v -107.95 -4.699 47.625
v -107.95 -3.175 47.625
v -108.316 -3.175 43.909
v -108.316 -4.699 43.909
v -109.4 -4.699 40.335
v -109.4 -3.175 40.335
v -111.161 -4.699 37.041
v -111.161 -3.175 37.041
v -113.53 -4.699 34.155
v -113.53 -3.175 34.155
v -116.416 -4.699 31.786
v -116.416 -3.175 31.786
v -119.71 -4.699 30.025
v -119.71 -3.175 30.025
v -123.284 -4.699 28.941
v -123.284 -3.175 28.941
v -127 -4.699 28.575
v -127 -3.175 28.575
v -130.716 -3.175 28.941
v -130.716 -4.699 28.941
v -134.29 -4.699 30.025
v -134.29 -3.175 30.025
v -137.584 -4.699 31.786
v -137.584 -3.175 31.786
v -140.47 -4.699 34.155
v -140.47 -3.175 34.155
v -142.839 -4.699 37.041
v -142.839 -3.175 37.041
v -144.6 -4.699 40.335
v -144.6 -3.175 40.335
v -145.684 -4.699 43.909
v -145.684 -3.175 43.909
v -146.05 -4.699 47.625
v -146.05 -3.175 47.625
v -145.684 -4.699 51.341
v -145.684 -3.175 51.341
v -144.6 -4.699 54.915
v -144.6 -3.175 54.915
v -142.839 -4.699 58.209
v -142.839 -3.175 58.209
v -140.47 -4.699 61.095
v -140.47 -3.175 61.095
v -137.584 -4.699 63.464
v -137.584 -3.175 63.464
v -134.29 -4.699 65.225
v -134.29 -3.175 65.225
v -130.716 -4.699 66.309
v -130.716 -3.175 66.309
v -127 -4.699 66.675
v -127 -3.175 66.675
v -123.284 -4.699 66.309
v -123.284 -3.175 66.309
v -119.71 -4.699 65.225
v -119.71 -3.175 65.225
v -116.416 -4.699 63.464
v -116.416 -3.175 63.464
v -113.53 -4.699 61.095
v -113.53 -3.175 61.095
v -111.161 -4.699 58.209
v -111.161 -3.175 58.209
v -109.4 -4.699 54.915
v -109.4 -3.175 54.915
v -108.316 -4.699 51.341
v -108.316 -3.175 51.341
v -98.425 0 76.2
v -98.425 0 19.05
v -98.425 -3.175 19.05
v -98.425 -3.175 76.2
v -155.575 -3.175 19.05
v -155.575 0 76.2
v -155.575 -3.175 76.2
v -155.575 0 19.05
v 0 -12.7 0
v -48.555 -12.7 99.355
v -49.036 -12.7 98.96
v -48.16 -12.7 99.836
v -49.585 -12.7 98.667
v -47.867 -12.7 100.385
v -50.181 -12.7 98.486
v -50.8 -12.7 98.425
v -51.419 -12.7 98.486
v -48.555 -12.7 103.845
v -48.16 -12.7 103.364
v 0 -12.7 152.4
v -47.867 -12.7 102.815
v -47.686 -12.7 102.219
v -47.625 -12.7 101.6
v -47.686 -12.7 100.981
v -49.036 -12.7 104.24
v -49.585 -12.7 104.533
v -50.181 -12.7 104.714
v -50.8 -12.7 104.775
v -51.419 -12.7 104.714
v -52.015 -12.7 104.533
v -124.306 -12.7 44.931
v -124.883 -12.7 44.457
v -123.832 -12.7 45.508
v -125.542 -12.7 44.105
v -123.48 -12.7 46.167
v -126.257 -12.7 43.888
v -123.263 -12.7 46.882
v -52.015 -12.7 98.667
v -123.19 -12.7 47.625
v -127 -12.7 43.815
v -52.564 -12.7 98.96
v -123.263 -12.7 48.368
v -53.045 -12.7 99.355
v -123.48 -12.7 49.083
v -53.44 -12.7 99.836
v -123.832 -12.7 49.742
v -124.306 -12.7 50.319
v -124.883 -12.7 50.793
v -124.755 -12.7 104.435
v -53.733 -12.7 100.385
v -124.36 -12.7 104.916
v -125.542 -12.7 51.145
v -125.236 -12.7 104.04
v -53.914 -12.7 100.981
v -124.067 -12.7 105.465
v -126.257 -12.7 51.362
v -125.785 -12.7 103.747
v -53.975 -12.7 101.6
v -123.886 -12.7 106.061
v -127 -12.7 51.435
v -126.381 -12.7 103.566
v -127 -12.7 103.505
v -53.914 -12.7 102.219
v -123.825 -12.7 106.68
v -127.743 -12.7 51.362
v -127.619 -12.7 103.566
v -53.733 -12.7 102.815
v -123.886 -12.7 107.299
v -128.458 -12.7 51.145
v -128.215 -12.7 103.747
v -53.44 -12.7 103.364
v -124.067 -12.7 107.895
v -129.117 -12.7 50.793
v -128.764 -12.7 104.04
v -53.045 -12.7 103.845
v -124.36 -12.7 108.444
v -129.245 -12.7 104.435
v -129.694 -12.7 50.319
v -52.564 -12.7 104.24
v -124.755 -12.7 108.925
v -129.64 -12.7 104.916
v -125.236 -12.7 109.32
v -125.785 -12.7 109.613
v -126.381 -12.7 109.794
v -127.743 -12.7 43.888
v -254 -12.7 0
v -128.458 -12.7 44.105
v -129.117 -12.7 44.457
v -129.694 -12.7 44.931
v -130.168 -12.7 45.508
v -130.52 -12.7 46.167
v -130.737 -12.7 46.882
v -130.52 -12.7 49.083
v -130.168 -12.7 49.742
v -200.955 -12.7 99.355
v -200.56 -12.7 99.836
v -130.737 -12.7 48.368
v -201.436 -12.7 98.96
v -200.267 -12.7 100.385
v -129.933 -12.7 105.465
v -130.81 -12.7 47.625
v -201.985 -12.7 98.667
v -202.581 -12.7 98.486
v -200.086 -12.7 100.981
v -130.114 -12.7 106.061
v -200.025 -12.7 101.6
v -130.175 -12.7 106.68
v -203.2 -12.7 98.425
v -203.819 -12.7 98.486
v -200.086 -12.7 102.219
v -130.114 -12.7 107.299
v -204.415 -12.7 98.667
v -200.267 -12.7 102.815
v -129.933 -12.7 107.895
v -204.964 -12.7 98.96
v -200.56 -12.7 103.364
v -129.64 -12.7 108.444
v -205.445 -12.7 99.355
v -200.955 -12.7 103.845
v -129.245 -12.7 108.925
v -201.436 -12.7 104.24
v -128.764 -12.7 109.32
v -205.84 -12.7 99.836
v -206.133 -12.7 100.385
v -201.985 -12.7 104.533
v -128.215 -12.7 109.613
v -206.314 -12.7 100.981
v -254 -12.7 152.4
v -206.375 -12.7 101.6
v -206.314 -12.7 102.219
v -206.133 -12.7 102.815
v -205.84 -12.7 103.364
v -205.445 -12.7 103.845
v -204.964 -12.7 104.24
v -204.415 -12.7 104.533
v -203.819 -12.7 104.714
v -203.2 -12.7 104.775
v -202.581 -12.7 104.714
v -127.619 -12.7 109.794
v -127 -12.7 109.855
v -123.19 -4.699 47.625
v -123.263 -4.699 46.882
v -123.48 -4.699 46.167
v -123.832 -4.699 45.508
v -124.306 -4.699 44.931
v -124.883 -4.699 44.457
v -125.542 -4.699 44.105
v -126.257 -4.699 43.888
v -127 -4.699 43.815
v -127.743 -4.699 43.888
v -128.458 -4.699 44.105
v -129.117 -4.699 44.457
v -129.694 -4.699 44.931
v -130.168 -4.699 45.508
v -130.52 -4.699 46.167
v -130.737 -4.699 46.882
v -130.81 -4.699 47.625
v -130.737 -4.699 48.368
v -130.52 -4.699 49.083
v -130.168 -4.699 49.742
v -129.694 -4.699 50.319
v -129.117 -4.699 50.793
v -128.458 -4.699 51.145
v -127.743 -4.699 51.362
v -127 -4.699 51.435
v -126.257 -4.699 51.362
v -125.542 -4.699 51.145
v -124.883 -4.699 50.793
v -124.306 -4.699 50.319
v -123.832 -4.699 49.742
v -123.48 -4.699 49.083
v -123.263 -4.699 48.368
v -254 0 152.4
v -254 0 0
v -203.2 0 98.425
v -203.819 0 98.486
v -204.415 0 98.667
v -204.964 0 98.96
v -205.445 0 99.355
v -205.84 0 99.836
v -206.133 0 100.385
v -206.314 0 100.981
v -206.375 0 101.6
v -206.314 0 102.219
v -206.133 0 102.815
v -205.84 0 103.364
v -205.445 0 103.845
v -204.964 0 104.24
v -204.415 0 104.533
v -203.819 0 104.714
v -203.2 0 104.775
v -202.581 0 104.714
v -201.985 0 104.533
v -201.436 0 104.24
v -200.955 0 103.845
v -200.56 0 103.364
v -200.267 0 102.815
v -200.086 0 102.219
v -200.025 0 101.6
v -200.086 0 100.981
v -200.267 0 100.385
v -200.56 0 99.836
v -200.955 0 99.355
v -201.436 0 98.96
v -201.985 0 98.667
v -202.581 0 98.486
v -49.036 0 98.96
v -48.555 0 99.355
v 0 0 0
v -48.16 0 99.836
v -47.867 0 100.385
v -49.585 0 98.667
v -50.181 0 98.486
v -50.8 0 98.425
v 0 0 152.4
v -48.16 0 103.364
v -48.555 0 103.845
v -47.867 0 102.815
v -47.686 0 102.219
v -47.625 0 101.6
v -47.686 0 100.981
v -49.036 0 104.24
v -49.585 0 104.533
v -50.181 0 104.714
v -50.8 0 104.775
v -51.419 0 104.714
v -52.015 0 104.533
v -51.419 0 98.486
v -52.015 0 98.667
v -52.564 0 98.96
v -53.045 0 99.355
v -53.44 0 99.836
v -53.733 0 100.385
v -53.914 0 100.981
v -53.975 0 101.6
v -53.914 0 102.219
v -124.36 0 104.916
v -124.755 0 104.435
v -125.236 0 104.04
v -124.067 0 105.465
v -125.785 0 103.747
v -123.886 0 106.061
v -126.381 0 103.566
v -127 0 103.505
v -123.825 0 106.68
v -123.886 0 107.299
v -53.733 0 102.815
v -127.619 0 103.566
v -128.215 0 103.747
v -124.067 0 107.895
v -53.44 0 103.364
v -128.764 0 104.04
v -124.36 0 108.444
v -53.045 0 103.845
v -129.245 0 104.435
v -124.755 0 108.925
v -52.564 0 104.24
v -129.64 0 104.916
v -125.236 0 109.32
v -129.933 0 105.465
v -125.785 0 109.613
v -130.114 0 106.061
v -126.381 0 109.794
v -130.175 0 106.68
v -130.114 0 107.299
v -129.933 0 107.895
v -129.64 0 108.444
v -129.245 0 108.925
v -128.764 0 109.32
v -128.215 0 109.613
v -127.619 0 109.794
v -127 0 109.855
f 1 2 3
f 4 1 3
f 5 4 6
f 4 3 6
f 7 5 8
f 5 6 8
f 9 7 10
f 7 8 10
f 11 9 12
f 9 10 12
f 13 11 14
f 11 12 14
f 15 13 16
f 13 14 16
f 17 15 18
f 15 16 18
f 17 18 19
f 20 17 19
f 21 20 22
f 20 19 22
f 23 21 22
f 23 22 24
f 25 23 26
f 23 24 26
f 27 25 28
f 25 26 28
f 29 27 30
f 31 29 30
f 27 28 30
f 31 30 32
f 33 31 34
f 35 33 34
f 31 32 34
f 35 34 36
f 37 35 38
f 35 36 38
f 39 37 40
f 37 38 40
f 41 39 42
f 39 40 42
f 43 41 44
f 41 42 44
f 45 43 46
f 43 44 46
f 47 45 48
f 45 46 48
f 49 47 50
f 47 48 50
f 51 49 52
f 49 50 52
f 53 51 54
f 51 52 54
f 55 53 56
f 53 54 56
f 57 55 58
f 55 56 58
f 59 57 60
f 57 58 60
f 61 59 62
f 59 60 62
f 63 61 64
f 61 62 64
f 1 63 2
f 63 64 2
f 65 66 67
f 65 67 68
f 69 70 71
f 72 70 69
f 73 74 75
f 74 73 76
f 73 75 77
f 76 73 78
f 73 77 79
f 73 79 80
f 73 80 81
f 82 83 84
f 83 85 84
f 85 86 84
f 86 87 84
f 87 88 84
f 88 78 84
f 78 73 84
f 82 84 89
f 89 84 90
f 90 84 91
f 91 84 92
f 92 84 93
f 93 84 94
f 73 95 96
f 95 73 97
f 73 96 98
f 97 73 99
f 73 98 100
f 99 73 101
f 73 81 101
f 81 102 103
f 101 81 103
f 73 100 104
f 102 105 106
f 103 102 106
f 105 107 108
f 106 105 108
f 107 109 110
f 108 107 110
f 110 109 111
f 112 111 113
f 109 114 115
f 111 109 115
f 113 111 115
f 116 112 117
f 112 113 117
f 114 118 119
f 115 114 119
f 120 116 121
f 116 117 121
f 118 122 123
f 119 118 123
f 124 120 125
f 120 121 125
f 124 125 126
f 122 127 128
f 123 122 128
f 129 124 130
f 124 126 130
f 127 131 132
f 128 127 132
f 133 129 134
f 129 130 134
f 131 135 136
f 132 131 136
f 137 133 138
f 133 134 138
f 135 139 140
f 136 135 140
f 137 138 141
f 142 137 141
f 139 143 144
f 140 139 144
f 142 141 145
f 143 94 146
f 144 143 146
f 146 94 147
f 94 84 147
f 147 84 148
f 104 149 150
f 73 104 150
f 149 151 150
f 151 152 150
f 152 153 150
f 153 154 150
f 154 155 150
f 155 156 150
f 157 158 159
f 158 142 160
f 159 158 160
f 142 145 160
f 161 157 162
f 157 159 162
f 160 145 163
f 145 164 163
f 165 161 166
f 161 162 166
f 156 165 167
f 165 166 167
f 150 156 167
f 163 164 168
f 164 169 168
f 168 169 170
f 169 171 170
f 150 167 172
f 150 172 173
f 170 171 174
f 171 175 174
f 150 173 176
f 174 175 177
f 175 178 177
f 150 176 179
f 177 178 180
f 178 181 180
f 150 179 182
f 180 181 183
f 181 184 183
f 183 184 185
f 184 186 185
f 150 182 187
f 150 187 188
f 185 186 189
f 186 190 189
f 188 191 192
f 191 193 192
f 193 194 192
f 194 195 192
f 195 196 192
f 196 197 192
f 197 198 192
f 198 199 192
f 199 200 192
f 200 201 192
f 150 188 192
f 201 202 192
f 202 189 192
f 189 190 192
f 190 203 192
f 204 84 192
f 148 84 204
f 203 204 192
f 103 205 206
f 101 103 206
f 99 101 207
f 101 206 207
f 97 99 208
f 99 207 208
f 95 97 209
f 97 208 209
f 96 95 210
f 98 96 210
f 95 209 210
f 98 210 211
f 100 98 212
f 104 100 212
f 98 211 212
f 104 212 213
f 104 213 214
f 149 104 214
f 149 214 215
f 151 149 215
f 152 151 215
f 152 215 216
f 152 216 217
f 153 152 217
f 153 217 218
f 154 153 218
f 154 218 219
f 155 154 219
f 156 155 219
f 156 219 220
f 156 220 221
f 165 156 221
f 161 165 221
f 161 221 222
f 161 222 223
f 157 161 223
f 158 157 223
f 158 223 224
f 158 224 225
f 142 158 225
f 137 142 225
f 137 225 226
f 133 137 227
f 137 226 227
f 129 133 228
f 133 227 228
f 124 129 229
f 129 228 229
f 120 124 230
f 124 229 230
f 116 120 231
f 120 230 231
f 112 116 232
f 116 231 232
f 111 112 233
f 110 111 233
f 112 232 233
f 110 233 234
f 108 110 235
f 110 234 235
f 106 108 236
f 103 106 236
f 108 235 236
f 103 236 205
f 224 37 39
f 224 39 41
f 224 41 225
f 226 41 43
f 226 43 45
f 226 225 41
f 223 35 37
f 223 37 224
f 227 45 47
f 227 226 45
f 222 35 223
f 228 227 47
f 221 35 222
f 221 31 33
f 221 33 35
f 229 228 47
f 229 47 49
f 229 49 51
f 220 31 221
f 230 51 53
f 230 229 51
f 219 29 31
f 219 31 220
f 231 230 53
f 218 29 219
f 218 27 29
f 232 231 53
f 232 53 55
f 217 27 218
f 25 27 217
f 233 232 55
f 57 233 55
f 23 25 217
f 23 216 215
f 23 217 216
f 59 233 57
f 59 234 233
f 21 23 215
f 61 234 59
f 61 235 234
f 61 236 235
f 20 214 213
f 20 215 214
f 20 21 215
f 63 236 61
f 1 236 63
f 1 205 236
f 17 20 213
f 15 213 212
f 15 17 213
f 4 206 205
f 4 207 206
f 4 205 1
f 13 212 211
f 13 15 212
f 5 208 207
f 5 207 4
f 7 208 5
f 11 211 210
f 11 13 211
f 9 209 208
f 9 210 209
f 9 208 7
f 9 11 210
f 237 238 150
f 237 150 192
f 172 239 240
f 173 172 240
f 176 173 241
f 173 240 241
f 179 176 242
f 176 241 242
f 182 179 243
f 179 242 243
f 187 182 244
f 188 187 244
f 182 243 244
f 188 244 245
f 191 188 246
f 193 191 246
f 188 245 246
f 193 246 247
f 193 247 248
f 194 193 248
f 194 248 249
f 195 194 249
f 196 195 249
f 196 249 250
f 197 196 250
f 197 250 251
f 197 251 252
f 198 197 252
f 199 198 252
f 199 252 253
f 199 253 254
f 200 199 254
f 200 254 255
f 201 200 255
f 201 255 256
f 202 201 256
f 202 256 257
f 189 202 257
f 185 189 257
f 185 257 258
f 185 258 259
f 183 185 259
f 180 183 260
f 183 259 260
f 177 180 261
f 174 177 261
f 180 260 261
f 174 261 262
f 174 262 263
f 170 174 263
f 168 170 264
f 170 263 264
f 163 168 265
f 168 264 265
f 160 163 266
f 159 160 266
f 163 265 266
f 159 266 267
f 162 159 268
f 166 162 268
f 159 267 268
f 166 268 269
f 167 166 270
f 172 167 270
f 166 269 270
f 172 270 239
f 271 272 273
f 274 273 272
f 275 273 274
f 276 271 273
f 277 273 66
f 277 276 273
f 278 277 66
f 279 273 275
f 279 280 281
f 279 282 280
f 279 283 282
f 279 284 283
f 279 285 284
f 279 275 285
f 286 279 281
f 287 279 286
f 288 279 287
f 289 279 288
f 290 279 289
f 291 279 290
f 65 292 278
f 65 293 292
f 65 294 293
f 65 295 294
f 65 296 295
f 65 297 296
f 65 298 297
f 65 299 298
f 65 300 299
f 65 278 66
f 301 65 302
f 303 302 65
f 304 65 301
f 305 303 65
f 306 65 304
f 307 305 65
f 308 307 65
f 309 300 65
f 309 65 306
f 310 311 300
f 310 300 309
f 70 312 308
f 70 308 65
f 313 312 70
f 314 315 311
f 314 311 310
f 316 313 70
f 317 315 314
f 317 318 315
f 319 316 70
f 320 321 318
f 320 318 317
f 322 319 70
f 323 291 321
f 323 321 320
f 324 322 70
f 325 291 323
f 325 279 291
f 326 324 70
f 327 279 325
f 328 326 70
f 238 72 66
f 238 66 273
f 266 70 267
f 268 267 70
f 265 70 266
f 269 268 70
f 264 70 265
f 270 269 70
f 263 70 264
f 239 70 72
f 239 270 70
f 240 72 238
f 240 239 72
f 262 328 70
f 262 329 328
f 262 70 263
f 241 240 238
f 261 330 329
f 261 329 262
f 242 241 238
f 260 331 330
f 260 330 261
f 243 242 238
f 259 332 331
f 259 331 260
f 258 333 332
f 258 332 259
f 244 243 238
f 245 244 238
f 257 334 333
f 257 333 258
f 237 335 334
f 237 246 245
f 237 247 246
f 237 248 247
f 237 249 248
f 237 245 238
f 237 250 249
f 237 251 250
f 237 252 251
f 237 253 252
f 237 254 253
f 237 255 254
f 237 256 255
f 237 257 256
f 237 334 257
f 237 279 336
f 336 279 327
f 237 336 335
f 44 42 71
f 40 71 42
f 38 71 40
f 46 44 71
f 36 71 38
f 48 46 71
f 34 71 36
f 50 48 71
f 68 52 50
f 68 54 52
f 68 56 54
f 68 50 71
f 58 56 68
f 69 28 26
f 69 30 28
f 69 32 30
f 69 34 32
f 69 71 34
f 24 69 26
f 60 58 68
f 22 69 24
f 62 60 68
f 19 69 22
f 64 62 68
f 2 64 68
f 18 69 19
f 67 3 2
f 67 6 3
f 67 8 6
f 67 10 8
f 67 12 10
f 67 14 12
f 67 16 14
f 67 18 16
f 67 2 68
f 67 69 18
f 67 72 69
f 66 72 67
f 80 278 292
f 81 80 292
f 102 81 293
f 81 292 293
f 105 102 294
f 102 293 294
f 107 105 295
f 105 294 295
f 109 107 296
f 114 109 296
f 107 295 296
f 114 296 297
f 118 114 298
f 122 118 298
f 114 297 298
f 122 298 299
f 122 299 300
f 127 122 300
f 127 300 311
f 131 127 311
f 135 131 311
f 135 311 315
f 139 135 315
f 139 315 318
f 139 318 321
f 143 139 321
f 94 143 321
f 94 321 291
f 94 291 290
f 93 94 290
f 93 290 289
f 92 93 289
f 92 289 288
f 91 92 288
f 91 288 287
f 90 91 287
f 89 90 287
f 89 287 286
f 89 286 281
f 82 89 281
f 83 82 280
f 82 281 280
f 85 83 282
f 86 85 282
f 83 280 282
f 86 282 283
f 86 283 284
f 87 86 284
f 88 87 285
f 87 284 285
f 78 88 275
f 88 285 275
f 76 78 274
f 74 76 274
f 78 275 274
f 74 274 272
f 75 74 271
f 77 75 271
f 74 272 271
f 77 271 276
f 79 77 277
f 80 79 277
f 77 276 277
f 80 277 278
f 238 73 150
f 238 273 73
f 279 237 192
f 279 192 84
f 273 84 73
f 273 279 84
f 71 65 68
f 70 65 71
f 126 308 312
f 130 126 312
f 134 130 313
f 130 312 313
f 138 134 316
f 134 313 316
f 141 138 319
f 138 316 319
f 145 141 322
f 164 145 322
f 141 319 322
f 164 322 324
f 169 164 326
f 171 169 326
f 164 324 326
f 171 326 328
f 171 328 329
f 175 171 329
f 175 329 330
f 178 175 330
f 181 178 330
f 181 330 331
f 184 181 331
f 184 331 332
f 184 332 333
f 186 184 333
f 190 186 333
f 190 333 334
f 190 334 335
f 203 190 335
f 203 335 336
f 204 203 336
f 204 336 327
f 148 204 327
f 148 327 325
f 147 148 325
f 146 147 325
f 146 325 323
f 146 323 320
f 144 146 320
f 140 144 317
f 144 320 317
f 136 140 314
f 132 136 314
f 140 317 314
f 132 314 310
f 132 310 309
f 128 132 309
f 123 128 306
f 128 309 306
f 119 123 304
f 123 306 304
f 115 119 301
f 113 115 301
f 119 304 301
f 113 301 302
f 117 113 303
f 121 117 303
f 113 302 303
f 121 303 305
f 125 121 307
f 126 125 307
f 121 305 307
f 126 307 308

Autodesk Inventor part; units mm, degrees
ref_plane "YZ Plane" through (0, 0, 0) normal (1, 0, 0) x (0, 1, 0)
ref_plane "XZ Plane" through (0, 0, 0) normal (0, 1, 0) x (-1, 0, 0)
ref_plane "XY Plane" through (0, 0, 0) normal (0, 0, 1) x (1, 0, 0)
sketch "Sketch1" plane through (0, 0, 0) normal (0, 1, 0) x (-1, 0, 0)
  line L0 (0, 0) -> (254, 0)
  line L1 (254, 0) -> (254, 152.4)
  line L2 (254, 152.4) -> (0, 152.4)
  line L3 (0, 152.4) -> (0, 0)
  dimension "d0" = 254
  dimension "d1" = 152.4
extrude "Extrusion1" add sketch "Sketch1" against normal blind 12.7
sketch "Sketch2" plane through (0, 0, 0) normal (0, 1, 0) x (1, 0, 0)
  line L0 (0, 0) -> (-254, 0) projected
  line L1 (-254, 0) -> (-254, -152.4) projected
  line L2 (0, -152.4) -> (0, 0) projected
  line L3 (-155.575, -19.05) -> (-98.425, -19.05)
  line L4 (-98.425, -19.05) -> (-98.425, -76.2)
  line L5 (-98.425, -76.2) -> (-155.575, -76.2)
  line L6 (-155.575, -76.2) -> (-155.575, -19.05)
  dimension "d4" = 57.15
  dimension "d6" = 57.15
  dimension "d7" = 98.425
  dimension "d8" = 98.425
  dimension "d9" = 19.05
extrude "Extrusion2" cut sketch "Sketch2" against normal blind 3.175
sketch "Sketch3" plane through (0, -3.175, 0) normal (0, 1, 0) x (1, 0, 0)
  line L0 (-98.425, -76.2) -> (-155.575, -76.2) projected
  line L1 (-98.425, -19.05) -> (-98.425, -76.2) projected
  circle A0 centre (-127, -47.625) radius 19.05
  point P0 (0, 0)
  dimension "d12" = 38.1
  dimension "d13" = 28.575
  dimension "d14" = 28.575
extrude "Extrusion3" cut sketch "Sketch3" against normal blind 1.524
sketch "Sketch4" plane through (-127, -4.699, 47.625) normal (0, 1, 0) x (1, 0, 0)
  circle A0 centre (0, 0) radius 19.05 projected
  circle A1 centre (0, 0) radius 3.81
  point P0 (127, 47.625)
  dimension "d17" = 7.62
extrude "Extrusion4" cut sketch "Sketch4" against normal through all contours A1
sketch "Sketch5" plane through (0, -12.7, 0) normal (0, -1, 0) x (1, 0, 0)
  line L0 (0, 0) -> (0, 152.4) projected
  line L1 (0, 152.4) -> (-254, 152.4) projected
  line L2 (-254, 152.4) -> (-254, 0) projected
  circle A0 centre (-127, 47.625) radius 3.81 projected
  point P0 (-50.8, 101.6)
  point P1 (-203.2, 101.6)
  point P2 (-127, 106.68)
  dimension "d20" = 50.8
  dimension "d21" = 50.8
  dimension "d22" = 50.8
  dimension "d30" = 5.08
hole "Hole1" at (-50.8, -12.7, 101.6) at (-203.2, -12.7, 101.6) at (-127, -12.7, 106.68) direction (0, 1, 0) diameter 6.35 end through all
equation "\"d7\" = d8"
equation "\"d22\" = d21"
properties part number "tractor"
